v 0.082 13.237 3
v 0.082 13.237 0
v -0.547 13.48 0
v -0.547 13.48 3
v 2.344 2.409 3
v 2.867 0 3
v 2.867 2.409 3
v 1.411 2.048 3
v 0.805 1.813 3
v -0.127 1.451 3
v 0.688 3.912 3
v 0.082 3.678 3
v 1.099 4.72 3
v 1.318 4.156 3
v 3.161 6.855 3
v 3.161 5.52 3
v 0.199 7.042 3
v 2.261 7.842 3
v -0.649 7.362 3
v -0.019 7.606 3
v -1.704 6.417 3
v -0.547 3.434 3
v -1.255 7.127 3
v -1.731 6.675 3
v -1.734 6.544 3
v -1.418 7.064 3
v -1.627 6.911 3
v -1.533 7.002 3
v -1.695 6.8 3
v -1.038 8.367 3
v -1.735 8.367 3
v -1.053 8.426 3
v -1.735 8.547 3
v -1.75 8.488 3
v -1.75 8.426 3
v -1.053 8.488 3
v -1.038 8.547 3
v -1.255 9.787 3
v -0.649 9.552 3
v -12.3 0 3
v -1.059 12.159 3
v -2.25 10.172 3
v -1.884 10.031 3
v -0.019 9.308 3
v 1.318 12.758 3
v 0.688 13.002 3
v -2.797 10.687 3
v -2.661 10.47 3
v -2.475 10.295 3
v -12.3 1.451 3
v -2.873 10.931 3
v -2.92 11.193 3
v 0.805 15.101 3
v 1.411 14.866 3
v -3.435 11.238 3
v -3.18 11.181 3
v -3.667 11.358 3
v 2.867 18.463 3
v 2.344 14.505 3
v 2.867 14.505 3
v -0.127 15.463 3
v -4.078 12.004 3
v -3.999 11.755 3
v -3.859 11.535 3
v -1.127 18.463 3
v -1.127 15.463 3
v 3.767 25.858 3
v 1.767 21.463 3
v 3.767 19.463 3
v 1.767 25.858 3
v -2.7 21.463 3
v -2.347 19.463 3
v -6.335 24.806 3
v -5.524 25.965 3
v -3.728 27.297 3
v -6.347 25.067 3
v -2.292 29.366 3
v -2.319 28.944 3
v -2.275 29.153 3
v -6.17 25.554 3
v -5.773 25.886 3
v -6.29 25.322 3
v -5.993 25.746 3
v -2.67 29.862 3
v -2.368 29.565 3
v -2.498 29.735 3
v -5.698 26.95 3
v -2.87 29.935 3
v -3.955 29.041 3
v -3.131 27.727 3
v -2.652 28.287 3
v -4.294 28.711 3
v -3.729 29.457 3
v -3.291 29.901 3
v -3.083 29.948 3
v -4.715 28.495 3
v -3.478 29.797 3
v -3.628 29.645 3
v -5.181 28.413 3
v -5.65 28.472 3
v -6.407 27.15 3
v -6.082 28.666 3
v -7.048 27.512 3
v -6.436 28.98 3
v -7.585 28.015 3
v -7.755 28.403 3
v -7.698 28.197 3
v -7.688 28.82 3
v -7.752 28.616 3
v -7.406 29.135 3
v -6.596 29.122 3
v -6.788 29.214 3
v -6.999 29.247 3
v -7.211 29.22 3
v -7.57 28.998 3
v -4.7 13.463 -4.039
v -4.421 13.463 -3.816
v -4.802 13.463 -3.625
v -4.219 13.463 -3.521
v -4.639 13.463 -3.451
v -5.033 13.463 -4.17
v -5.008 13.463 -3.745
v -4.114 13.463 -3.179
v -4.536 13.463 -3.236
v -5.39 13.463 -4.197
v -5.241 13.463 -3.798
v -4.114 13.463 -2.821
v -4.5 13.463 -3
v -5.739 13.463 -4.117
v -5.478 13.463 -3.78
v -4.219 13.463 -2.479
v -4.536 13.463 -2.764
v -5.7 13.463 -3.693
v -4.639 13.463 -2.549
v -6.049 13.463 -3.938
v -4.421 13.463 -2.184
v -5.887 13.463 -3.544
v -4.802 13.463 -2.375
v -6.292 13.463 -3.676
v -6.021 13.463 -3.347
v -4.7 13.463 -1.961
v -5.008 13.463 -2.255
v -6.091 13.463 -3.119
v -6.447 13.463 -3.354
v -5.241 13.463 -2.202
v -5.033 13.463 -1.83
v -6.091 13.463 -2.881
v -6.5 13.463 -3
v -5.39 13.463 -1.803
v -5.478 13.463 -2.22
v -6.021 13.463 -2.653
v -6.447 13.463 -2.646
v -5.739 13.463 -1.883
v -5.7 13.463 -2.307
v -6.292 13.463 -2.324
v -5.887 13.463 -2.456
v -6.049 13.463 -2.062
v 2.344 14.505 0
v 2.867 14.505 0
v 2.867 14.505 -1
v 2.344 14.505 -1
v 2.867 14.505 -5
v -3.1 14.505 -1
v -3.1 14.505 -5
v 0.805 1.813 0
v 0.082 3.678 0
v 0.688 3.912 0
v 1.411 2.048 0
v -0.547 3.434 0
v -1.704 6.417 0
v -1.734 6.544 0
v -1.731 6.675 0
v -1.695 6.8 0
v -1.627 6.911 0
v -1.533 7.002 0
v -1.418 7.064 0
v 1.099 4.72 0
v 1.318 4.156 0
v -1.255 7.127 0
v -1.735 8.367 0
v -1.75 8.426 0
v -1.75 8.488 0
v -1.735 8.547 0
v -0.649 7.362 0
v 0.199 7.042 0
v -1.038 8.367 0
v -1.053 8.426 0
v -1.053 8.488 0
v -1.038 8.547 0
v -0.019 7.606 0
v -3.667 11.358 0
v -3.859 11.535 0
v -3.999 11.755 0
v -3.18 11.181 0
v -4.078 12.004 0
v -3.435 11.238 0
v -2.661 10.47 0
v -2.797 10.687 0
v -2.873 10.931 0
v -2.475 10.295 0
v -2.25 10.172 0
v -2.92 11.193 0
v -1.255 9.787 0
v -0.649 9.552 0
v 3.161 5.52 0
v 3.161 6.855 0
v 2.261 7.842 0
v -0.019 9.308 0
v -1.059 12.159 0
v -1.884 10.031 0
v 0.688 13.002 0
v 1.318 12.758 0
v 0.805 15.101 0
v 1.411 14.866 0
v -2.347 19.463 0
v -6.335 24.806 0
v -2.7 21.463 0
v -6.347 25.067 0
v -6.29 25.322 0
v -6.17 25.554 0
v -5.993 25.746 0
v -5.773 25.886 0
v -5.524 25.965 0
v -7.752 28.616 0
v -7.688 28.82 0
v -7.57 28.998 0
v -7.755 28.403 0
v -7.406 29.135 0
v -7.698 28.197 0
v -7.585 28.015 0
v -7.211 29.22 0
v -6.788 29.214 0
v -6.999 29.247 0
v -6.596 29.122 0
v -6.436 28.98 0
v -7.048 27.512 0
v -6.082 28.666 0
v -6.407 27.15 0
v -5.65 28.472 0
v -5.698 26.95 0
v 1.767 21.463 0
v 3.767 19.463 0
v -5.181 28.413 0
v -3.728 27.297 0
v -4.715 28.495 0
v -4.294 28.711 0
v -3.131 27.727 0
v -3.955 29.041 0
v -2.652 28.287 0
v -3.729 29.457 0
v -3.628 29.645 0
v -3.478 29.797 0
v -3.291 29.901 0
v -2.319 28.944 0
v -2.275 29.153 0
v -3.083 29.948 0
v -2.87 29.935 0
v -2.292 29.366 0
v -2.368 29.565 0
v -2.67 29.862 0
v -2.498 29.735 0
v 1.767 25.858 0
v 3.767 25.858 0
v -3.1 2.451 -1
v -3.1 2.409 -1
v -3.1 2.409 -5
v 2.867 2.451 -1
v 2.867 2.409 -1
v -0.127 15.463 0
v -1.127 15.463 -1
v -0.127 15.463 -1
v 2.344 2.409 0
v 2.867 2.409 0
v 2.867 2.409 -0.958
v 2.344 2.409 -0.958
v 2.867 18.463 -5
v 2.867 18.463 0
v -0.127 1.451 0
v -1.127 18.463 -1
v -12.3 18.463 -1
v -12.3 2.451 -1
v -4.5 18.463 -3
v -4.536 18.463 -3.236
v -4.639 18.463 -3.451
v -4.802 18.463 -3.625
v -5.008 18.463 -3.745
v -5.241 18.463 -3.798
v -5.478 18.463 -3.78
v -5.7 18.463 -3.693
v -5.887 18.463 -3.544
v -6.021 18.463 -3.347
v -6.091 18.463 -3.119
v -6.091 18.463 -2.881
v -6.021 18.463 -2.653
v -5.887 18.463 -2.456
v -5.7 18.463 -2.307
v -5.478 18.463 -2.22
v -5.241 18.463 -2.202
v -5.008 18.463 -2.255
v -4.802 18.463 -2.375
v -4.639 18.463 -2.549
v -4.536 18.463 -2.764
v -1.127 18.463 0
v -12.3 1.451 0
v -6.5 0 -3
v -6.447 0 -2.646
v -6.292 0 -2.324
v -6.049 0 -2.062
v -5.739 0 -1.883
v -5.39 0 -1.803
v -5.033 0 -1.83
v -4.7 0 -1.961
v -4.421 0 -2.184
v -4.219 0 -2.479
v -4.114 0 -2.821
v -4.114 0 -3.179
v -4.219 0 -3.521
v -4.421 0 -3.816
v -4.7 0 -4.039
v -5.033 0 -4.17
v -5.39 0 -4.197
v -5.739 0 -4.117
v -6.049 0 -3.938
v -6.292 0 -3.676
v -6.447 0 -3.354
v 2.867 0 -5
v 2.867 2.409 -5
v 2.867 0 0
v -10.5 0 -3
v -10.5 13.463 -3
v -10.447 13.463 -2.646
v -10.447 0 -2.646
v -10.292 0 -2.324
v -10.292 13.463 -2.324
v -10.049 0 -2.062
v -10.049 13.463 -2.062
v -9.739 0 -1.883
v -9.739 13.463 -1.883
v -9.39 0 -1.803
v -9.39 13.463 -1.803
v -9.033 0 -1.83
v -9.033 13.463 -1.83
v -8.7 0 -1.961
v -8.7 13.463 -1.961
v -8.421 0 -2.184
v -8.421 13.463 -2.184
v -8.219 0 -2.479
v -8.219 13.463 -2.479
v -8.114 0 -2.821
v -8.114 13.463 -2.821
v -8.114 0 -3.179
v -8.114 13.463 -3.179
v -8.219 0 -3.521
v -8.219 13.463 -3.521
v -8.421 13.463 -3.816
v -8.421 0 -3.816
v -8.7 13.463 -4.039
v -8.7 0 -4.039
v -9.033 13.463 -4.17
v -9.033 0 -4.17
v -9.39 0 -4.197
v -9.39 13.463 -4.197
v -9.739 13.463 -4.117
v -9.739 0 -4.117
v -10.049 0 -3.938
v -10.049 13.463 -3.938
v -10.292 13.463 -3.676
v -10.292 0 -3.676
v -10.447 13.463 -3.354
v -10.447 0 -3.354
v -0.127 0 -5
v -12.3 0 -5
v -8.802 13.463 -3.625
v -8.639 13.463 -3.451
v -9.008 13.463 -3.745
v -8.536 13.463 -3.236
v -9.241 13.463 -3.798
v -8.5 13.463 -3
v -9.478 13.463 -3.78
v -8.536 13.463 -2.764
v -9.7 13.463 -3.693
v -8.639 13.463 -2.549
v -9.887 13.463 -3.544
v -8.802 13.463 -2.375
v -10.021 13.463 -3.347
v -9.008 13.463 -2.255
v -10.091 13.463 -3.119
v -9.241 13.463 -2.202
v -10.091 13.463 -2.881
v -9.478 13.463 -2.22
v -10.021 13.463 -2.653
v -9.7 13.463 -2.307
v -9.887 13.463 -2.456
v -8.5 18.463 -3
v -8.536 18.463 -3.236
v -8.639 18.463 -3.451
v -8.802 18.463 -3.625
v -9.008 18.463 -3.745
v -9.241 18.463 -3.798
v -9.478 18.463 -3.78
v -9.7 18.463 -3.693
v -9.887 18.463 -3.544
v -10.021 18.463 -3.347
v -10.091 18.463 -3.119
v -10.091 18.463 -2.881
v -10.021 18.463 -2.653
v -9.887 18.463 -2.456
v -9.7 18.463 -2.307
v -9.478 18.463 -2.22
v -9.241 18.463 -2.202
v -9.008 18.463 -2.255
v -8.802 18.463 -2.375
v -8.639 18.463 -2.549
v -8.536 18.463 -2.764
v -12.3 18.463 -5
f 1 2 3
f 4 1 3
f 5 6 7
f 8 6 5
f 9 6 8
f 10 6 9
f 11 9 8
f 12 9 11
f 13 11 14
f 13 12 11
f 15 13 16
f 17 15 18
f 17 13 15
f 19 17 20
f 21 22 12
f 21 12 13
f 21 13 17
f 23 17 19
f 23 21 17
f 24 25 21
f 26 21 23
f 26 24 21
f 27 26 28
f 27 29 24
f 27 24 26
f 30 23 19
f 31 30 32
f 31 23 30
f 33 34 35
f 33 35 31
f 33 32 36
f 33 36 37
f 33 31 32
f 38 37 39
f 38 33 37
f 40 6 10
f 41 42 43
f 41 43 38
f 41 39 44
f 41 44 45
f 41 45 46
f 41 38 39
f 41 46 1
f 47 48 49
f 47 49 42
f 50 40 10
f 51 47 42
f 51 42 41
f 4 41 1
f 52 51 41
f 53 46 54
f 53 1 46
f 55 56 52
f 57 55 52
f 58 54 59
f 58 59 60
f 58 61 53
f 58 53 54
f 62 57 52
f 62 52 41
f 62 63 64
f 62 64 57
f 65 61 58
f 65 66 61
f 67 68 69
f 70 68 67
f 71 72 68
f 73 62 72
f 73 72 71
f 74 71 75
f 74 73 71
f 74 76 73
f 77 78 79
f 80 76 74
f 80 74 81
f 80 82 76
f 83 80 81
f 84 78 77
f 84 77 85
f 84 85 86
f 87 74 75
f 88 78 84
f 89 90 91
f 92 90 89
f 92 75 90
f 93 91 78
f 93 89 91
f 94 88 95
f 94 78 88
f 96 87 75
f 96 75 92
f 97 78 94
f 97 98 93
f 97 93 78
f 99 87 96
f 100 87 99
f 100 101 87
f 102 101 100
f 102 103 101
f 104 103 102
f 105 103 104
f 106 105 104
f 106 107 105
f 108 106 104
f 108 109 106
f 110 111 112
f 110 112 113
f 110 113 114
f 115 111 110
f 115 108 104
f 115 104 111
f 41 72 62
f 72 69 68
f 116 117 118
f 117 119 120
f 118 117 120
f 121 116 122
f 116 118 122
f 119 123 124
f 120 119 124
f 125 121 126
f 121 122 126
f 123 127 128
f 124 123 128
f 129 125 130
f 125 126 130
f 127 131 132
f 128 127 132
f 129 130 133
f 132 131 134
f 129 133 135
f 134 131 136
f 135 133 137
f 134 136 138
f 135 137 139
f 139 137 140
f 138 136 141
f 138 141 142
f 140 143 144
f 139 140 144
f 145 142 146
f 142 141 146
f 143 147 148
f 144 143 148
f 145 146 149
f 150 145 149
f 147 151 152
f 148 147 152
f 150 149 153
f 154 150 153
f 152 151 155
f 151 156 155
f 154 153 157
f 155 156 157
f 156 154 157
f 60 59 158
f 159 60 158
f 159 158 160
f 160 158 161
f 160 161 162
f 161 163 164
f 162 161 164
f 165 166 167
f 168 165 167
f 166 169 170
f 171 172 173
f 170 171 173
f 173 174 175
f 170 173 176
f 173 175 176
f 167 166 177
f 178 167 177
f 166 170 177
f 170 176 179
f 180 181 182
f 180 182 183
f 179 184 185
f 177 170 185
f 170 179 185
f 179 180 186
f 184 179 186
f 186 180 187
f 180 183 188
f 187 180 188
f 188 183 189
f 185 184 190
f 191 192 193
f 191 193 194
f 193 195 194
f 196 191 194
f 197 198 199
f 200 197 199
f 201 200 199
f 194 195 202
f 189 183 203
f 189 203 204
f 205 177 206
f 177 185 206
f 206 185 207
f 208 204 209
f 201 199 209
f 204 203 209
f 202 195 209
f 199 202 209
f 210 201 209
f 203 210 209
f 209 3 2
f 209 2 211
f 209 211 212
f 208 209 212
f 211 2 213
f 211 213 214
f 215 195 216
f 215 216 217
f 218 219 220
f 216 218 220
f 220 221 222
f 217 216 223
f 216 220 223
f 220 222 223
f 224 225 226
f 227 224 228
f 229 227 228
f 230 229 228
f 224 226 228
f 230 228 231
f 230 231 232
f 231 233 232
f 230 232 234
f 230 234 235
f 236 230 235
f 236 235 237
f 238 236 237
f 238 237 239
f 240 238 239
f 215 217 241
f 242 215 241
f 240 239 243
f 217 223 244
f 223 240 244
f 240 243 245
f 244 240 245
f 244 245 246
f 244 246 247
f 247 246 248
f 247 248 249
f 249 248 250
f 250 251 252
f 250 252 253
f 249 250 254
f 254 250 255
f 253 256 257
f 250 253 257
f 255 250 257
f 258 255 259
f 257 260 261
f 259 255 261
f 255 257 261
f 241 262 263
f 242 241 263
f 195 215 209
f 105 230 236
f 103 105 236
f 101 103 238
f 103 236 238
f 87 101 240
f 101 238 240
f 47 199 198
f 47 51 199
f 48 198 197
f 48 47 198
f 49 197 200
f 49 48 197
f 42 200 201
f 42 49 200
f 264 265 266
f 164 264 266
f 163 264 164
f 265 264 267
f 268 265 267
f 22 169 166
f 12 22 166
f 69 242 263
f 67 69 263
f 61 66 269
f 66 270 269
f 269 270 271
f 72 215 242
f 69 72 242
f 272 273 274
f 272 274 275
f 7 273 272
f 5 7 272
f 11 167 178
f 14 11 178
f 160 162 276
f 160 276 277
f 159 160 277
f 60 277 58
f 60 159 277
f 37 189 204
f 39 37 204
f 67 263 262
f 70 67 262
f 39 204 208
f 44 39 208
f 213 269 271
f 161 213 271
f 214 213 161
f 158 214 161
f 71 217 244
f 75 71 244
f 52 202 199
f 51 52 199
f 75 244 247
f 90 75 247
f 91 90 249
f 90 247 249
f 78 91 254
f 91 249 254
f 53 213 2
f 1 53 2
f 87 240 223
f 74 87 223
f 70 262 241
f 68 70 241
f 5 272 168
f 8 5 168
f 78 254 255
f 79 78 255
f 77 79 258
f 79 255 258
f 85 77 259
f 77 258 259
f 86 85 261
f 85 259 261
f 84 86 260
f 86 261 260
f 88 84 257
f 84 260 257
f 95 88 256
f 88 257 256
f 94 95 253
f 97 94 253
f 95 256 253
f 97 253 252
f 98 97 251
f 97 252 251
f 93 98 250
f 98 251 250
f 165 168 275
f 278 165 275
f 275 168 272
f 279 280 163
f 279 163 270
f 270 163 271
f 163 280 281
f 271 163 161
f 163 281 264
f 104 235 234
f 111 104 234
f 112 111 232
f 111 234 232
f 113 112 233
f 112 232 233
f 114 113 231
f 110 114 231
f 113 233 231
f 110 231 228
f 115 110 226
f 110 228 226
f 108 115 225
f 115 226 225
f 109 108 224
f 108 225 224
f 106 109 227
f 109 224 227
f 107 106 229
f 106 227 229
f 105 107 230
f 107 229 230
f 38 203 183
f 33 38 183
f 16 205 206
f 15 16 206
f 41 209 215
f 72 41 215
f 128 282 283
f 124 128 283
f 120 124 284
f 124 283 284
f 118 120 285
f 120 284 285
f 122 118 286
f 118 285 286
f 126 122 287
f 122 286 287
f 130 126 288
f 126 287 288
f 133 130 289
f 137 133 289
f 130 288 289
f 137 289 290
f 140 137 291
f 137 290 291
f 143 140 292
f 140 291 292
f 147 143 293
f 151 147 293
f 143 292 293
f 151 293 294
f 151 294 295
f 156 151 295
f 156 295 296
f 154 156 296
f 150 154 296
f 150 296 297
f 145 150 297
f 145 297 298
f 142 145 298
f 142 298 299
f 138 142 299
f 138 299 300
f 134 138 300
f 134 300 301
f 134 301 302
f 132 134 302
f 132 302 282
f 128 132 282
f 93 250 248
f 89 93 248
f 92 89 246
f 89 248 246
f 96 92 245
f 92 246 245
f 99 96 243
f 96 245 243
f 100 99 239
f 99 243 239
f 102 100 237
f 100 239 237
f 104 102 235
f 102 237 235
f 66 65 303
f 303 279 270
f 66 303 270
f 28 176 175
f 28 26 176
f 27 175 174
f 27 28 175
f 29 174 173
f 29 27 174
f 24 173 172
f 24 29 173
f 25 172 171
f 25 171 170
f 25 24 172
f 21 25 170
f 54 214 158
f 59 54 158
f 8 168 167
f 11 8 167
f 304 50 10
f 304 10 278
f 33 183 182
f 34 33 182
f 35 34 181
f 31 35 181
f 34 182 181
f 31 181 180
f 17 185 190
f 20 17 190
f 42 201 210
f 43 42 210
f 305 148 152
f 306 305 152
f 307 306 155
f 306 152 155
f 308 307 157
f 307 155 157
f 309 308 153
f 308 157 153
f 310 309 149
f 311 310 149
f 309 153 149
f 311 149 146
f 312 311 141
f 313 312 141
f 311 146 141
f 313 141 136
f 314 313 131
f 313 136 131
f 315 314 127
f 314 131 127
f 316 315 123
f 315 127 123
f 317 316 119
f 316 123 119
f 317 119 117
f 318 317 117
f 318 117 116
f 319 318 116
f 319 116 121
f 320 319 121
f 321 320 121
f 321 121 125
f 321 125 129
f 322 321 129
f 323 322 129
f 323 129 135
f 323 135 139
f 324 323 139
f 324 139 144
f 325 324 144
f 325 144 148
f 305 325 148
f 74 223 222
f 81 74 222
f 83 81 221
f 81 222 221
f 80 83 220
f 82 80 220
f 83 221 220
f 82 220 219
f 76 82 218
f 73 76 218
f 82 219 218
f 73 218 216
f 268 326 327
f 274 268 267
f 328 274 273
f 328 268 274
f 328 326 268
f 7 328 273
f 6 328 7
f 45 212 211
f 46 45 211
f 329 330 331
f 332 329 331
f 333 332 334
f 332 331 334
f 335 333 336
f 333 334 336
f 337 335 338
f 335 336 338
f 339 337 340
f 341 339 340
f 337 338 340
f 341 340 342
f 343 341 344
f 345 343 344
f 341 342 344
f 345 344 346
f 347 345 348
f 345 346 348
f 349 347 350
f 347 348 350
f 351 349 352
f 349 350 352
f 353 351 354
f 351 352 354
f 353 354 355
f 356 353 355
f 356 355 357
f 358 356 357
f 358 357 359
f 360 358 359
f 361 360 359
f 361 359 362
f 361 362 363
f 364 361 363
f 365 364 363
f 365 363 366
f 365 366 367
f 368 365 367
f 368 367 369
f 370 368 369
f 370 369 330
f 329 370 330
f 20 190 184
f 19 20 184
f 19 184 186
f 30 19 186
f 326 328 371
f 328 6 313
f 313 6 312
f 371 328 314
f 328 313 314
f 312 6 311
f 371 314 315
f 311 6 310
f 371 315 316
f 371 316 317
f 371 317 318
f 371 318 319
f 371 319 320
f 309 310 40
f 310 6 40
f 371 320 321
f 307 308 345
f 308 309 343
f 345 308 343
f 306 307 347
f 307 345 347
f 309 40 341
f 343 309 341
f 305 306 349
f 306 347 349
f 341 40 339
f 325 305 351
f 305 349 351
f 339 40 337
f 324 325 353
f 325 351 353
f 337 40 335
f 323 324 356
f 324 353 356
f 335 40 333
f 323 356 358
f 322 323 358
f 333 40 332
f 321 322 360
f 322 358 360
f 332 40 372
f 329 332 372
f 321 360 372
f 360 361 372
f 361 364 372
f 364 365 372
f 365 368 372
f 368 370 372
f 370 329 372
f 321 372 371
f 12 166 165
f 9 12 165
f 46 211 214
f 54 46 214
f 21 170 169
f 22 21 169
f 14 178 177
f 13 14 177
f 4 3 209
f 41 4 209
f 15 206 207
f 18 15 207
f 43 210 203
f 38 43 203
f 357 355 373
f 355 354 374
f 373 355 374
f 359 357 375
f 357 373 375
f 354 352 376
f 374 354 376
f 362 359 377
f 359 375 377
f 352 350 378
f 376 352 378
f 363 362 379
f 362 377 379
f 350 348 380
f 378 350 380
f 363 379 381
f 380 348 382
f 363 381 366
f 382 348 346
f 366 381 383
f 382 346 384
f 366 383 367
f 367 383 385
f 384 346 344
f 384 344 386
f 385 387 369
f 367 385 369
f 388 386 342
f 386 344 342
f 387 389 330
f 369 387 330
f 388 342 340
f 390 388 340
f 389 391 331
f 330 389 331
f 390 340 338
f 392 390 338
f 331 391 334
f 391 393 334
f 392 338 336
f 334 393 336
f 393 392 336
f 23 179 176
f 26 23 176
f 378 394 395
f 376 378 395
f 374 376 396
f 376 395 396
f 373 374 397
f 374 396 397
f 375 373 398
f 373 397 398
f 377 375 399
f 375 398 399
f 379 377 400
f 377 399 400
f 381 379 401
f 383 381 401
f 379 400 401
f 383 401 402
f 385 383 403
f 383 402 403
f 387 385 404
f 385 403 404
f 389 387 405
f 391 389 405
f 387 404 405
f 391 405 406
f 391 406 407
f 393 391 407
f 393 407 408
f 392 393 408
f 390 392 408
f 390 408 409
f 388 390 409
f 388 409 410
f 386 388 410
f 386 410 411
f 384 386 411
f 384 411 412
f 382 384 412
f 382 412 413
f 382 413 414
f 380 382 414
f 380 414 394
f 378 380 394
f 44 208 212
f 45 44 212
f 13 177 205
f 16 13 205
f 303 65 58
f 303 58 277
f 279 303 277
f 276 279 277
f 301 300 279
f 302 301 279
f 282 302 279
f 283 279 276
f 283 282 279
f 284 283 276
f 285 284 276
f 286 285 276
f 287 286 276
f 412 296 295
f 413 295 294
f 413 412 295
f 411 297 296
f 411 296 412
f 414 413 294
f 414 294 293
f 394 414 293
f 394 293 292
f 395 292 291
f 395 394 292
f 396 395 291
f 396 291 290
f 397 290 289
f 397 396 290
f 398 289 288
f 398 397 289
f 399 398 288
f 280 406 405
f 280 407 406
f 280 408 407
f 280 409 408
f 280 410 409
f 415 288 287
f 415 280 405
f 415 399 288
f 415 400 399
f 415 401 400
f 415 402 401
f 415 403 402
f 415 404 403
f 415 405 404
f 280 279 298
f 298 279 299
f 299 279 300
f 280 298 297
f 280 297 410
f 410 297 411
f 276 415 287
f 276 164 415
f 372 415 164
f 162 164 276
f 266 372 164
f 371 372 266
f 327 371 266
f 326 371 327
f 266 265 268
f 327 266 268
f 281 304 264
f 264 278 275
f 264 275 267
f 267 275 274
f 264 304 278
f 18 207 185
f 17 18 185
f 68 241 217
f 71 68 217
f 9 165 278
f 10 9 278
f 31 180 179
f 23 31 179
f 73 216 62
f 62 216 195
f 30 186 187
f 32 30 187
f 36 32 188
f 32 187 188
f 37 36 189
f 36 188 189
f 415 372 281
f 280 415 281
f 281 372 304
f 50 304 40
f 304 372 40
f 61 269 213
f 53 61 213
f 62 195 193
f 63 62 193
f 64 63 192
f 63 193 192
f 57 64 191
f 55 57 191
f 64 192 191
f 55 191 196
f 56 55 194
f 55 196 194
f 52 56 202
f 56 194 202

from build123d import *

# Parameters (mm, degrees)
BOSS_SWITCH_BODY_DEPTH            = 3
SKETCH1_W                         = 2.994375291
SKETCH1_H                         = 2.409101515
SKETCH1_W_2                       = 3.994375291
SKETCH1_H_2                       = 3.957767538
BOSS_FLANGE_WIDTH_DEPTH           = 5
BOSS_FLANGE_HEIGHT_REACH          = 36.354
SKETCH2_W                         = 4
SKETCH2_H                         = 3.957767538
SKETCH2_W_2                       = 8
SKETCH2_H_2                       = 1.451333978
SKETCH17_W                        = 15.1675
SKETCH17_H                        = 4
BOSS_FLANGE_SUPPORT_DEPTH         = 13.053634428
CUT_WALL_GAP_DEPTH                = 1
TAP_DRILL_FOR_M2X0_4_TAP1_D       = 1.6
M2_CLEARANCE_HOLE2_D              = 2.4
M2_CLEARANCE_HOLE2_DEPTH          = 13.462735941
CHAMFER_FLANGE_SUPPORT_3_SIZE     = 1
FILLET1_R                         = 1
FILLET2_R                         = 0.5
SKETCH28_W                        = 5.9675
SKETCH28_H                        = 12.095866891
CUT_PRINT_SUPPORT_CLEARANCE_DEPTH = 33.624103931


with BuildPart() as part:
    # Sketch-SwitchBossUp → Boss-Switch Body (new body)
    with BuildSketch(Plane.XY):
        with BuildLine():
            Line((-5.697895702, 26.949658376), (-5.524247524, 25.964850623))
            ThreePointArc((-5.524247524, 25.964850623), (-6.169751391, 25.553619307), (-6.3354071, 24.806394693))
            Line((-6.3354071, 24.806394693), (-4.07798079, 12.003893904))
            ThreePointArc((-4.07798079, 12.003893904), (-3.666749473, 11.358390037), (-2.919524859, 11.192734328))
            Line((-2.919524859, 11.192734328), (-2.775521101, 10.376048434))
            Line((-2.775521101, 10.376048434), (-1.884274871, 10.03057987))
            Line((-1.884274871, 10.03057987), (-1.254903211, 9.786620214))
            Line((-1.254903211, 9.786620214), (-1.735258621, 8.547390389))
            ThreePointArc((-1.735258621, 8.547390389), (-1.752158006, 8.457034961), (-1.735258621, 8.366679532))
            Line((-1.735258621, 8.366679532), (-1.254903211, 7.127449707))
            Line((-1.254903211, 7.127449707), (-1.884274871, 6.883490051))
            Line((-1.884274871, 6.883490051), (-0.547014535, 3.433600952))
            Line((-0.547014535, 3.433600952), (0.082357125, 3.677560608))
            Line((0.082357125, 3.677560608), (0.805200549, 1.81275569))
            Line((0.805200549, 1.81275569), (-0.12720191, 1.451333978))
            Line((-0.12720191, 1.451333978), (-0.12720191, 0))
            Line((-0.12720191, 0), (2.867173381, 0))
            Line((2.867173381, 0), (2.867173381, 2.409101515))
            Line((2.867173381, 2.409101515), (2.343664607, 2.409101515))
            Line((2.343664607, 2.409101515), (1.411262148, 2.047679803))
            Line((1.411262148, 2.047679803), (0.688418723, 3.912484721))
            Line((0.688418723, 3.912484721), (1.317790383, 4.156444377))
            Line((1.317790383, 4.156444377), (1.099194858, 4.720381179))
            Line((1.099194858, 4.720381179), (3.161331824, 5.519715271))
            Line((3.161331824, 5.519715271), (3.161331824, 6.855167315))
            Line((3.161331824, 6.855167315), (2.261147576, 7.841686204))
            Line((2.261147576, 7.841686204), (0.199125572, 7.042396674))
            Line((0.199125572, 7.042396674), (-0.019469953, 7.606333476))
            Line((-0.019469953, 7.606333476), (-0.648841612, 7.36237382))
            Line((-0.648841612, 7.36237382), (-1.038134762, 8.366679532))
            ThreePointArc((-1.038134762, 8.366679532), (-1.055034148, 8.457034961), (-1.038134762, 8.547390389))
            Line((-1.038134762, 8.547390389), (-0.648841612, 9.551696101))
            Line((-0.648841612, 9.551696101), (-0.019469953, 9.307736445))
            Line((-0.019469953, 9.307736445), (1.317790383, 12.757625544))
            Line((1.317790383, 12.757625544), (0.688418723, 13.0015852))
            Line((0.688418723, 13.0015852), (1.411262148, 14.866390118))
            Line((1.411262148, 14.866390118), (2.343664607, 14.504968406))
            Line((2.343664607, 14.504968406), (2.867173381, 14.504968406))
            Line((2.867173381, 14.504968406), (2.867173381, 18.462735944))
            Line((2.867173381, 18.462735944), (-0.111637615, 18.462735944))
            Line((-0.111637615, 18.462735944), (-1.12720191, 18.462735944))
            Line((-1.12720191, 18.462735944), (-1.12720191, 15.462735944))
            Line((-1.12720191, 15.462735944), (-0.12720191, 15.462735944))
            Line((-0.12720191, 15.462735944), (0.805200549, 15.101314231))
            Line((0.805200549, 15.101314231), (0.082357125, 13.236509313))
            Line((0.082357125, 13.236509313), (-0.547014535, 13.480468969))
            Line((-0.547014535, 13.480468969), (-1.059112089, 12.159350171))
            Line((-1.059112089, 12.159350171), (-2.346896051, 19.462735944))
            Line((-2.346896051, 19.462735944), (3.767173381, 19.462735944))
            Line((3.767173381, 19.462735944), (3.767173381, 25.857619356))
            Line((3.767173381, 25.857619356), (1.767173381, 25.857619356))
            Line((1.767173381, 25.857619356), (1.767173381, 21.462735944))
            Line((1.767173381, 21.462735944), (-2.699550012, 21.462735944))
            Line((-2.699550012, 21.462735944), (-3.728280196, 27.296954732))
            ThreePointArc((-3.728280196, 27.296954732), (-2.874356585, 27.992742953), (-2.319025652, 28.944012807))
            ThreePointArc((-2.319025652, 28.944012807), (-2.76728001, 29.905297381), (-3.728564583, 29.457043022))
            ThreePointArc((-3.728564583, 29.457043022), (-4.944660137, 28.436617692), (-6.436422172, 28.97957467))
            ThreePointArc((-6.436422172, 28.97957467), (-7.493046212, 29.072017295), (-7.585488837, 28.015393255))
            ThreePointArc((-7.585488837, 28.015393255), (-6.738295005, 27.311426358), (-5.697895702, 26.949658376))
        make_face()
    extrude(amount=BOSS_SWITCH_BODY_DEPTH)

    # Sketch1 → Boss-Flange Width (add)
    with BuildSketch(Plane(origin=(0, 0, 0), x_dir=(-1, 0, 0), z_dir=(0, 0, -1))):
        with Locations((-1.369985736, 1.204550758)):
            Rectangle(SKETCH1_W, SKETCH1_H)
        with Locations((-0.869985736, 16.483852175)):
            Rectangle(SKETCH1_W_2, SKETCH1_H_2)
    extrude(amount=BOSS_FLANGE_WIDTH_DEPTH)

    # Boss-Flange Height: up to this face of the body (flat: up to its plane)
    boss_flange_height_end = Plane(part.part.faces().sort_by_distance((-0.12720191, 1.077409098, -1.438016547))[0])
    # Sketch2 → Boss-Flange Height (add, up to the picked face)
    with BuildSketch(Plane(origin=(-12.300326619, 0, 0), x_dir=(0, 0, -1), z_dir=(1, 0, 0)), mode=Mode.PRIVATE) as boss_flange_height_sk1:
        with Locations((3, 16.483852175)):
            Rectangle(SKETCH2_W, SKETCH2_H)
    boss_flange_height_tool1 = split(extrude(boss_flange_height_sk1.sketch, amount=BOSS_FLANGE_HEIGHT_REACH, mode=Mode.PRIVATE), bisect_by=boss_flange_height_end, keep=Keep.BOTH, mode=Mode.PRIVATE)
    # Sketch2 → Boss-Flange Height (add, up to the picked face)
    with BuildSketch(Plane(origin=(-12.300326619, 0, 0), x_dir=(0, 0, -1), z_dir=(1, 0, 0)), mode=Mode.PRIVATE) as boss_flange_height_sk2:
        with Locations((1, 0.725666989)):
            Rectangle(SKETCH2_W_2, SKETCH2_H_2)
    boss_flange_height_tool2 = split(extrude(boss_flange_height_sk2.sketch, amount=BOSS_FLANGE_HEIGHT_REACH, mode=Mode.PRIVATE), bisect_by=boss_flange_height_end, keep=Keep.BOTH, mode=Mode.PRIVATE)
    add(boss_flange_height_tool1.solids().sort_by(Axis((-12.300327, 16.483852, -3), (1, 0, 0)))[0])
    add(boss_flange_height_tool2.solids().sort_by(Axis((-12.300327, 0.725667, -1), (1, 0, 0)))[0])

    # Sketch17 → Boss-Flange Support (add)
    with BuildSketch(Plane.XZ.offset(-1.451333978)):
        with Locations((-4.716576619, -3)):
            Rectangle(SKETCH17_W, SKETCH17_H)
    extrude(amount=-BOSS_FLANGE_SUPPORT_DEPTH)

    # Sketch27 → Cut-Wall Gap (cut)
    with BuildSketch(Plane.XY):
        Polygon((-0.12720191, 15.462735944), (2.343664607, 14.504968406), (-1.12720191, 14.504968406), (-1.12720191, 15.462735944), align=None)
        Polygon((2.343664607, 2.409101515), (-0.12720191, 2.409101515), (-0.12720191, 1.451333978), align=None)
    extrude(amount=-CUT_WALL_GAP_DEPTH, mode=Mode.SUBTRACT)

    # Tap Drill for M2x0.4 Tap1 (through all)
    with Locations(Plane(origin=(0, 0, 0), x_dir=(-1, 0, 0), z_dir=(0, -1, 0))):
        with Locations((9.300326619, 3), (5.300326619, 3)):
            Hole(TAP_DRILL_FOR_M2X0_4_TAP1_D / 2)

    # M2 Clearance Hole2
    with Locations(Plane.XZ):
        with Locations((-9.300326619, -3), (-5.300326619, -3)):
            Hole(M2_CLEARANCE_HOLE2_D / 2, depth=M2_CLEARANCE_HOLE2_DEPTH)

    # Chamfer-Flange Support 3
    chamfer_flange_support_3_edges = [part.edges().sort_by_distance(p)[0] for p in [
        (-6.213764264, 1.451333978, -1),
    ]]
    chamfer(chamfer_flange_support_3_edges, length=CHAMFER_FLANGE_SUPPORT_3_SIZE)

    # Fillet1
    fillet1_edges = [part.edges().sort_by_distance(p)[0] for p in [
        (-2.775521101, 10.376048434, 1.5),
    ]]
    fillet(fillet1_edges, radius=FILLET1_R)

    # Fillet2
    fillet2_edges = [part.edges().sort_by_distance(p)[0] for p in [
        (-1.884274871, 6.883490051, 1.5),
    ]]
    fillet(fillet2_edges, radius=FILLET2_R)

    # Sketch28 → Cut-Print Support Clearance (cut, through all)
    with BuildSketch(Plane.XY.offset(-1)):
        with Locations((-0.116576619, 8.457034961)):
            Rectangle(SKETCH28_W, SKETCH28_H)
    extrude(amount=-CUT_PRINT_SUPPORT_CLEARANCE_DEPTH, mode=Mode.SUBTRACT)


solid = part.part
